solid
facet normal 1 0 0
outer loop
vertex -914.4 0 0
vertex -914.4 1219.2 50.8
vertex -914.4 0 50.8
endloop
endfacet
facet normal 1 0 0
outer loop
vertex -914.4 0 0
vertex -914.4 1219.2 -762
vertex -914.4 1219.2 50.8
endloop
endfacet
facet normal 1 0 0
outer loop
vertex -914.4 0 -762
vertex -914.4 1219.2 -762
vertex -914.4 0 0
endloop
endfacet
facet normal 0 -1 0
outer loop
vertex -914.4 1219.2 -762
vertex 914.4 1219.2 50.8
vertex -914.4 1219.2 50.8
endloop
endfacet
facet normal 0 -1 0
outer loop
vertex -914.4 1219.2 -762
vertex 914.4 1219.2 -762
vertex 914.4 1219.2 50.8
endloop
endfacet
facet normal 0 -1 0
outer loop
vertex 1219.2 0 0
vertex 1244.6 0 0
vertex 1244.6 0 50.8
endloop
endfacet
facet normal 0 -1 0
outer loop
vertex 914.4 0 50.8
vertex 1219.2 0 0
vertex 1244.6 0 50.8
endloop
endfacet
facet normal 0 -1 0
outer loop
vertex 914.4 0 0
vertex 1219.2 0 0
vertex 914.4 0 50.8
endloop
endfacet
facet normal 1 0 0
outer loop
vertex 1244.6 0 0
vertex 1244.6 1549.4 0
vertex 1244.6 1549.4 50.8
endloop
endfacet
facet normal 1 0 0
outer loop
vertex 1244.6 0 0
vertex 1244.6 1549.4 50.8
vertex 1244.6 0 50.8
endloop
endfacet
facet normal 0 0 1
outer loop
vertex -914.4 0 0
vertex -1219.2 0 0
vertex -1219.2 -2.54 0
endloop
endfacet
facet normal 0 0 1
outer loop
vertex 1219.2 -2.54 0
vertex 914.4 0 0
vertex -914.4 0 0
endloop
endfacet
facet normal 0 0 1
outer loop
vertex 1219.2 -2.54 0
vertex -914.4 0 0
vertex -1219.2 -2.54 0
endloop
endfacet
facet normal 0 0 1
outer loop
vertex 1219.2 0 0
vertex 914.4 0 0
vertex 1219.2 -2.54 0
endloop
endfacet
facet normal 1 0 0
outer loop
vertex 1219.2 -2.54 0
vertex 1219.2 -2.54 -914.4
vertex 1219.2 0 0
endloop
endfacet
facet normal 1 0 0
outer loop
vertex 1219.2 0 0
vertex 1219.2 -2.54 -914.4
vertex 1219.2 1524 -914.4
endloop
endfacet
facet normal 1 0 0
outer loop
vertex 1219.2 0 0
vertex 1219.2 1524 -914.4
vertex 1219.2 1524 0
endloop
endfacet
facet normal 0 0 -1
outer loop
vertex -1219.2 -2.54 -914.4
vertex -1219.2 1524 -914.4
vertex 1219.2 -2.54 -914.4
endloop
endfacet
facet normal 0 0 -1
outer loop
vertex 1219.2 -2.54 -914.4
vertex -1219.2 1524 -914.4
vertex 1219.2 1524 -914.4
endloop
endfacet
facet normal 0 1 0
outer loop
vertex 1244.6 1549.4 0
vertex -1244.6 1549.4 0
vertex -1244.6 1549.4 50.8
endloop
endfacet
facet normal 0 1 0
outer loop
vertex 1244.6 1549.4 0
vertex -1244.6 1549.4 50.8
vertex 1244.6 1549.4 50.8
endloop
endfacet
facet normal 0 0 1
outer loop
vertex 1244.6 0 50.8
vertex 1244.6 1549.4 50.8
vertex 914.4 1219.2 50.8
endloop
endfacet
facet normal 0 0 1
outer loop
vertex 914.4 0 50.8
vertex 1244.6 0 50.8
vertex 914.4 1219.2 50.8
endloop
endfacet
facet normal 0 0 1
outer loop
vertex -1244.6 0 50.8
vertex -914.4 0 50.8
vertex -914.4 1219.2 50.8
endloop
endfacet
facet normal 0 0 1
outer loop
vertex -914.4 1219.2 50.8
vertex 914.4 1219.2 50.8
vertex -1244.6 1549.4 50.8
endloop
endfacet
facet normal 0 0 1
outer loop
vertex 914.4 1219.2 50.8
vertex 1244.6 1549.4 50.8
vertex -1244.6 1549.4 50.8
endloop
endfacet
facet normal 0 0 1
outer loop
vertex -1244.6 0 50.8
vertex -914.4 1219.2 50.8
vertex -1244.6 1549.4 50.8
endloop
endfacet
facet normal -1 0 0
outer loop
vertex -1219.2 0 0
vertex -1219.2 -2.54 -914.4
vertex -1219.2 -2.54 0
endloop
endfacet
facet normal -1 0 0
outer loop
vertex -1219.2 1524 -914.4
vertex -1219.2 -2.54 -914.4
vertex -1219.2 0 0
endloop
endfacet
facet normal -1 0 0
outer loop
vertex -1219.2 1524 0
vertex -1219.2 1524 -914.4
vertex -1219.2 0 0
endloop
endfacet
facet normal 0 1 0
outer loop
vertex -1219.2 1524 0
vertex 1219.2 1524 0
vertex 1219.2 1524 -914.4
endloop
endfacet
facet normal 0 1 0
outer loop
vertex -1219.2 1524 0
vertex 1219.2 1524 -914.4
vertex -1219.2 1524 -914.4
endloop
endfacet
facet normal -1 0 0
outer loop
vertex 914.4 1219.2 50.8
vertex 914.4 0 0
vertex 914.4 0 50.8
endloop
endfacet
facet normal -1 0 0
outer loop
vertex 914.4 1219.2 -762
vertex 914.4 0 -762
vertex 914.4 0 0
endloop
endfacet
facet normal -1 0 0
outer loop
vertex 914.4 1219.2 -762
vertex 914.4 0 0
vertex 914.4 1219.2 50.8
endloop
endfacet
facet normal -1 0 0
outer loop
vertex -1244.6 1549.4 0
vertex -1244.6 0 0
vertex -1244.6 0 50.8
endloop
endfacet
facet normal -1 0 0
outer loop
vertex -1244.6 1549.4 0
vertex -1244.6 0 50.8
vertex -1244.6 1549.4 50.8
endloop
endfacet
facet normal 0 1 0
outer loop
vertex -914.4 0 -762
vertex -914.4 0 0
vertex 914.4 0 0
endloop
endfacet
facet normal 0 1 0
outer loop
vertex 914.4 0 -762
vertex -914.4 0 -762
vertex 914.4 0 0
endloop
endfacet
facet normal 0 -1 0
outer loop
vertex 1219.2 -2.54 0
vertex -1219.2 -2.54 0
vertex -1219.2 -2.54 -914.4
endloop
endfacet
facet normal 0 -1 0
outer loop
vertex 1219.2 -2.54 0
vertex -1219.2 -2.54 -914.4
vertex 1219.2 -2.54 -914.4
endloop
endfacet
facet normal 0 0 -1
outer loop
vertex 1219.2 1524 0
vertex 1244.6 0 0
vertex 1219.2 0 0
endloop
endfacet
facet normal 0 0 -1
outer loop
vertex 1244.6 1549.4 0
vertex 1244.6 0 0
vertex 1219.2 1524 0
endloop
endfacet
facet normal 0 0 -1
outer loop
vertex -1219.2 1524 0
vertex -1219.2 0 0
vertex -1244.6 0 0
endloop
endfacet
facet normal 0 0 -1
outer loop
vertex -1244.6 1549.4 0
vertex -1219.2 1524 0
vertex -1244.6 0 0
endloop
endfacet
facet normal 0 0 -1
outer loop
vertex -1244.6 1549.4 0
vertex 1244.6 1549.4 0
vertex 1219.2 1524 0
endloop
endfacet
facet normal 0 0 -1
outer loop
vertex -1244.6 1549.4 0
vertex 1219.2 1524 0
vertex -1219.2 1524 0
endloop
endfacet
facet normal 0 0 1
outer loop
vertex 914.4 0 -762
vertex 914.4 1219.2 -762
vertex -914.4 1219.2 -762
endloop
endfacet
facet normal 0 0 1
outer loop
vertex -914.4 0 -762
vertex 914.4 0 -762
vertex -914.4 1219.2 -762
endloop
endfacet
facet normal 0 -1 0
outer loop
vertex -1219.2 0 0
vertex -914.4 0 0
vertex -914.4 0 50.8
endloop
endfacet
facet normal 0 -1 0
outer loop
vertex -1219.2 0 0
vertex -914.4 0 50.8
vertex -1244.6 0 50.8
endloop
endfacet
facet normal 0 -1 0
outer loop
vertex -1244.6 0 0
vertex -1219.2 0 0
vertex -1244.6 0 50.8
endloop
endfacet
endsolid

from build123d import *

# Parameters (mm, degrees)
BOSS_EXTRUDE1_DEPTH = 762
SKETCH2_W           = 2438.4
SKETCH2_H           = 1524
BOSS_EXTRUDE2_DEPTH = 152.4
SKETCH3_W           = 2438.4
SKETCH3_H           = 914.4
BOSS_EXTRUDE3_DEPTH = 2.54
BOSS_EXTRUDE4_DEPTH = 50.8


with BuildPart() as part:
    # Sketch1 → Boss-Extrude1 (new body)
    with BuildSketch(Plane.XY):
        Polygon((-1219.2, 0), (-914.4, 0), (-914.4, 1219.2), (914.4, 1219.2), (914.4, 0), (1219.2, 0), (1219.2, 1524), (-1219.2, 1524), align=None)
    extrude(amount=-BOSS_EXTRUDE1_DEPTH)

    # Sketch2 → Boss-Extrude2 (add)
    with BuildSketch(Plane(origin=(0, 0, -762), x_dir=(-1, 0, 0), z_dir=(0, 0, -1))):
        with Locations((0, 762)):
            Rectangle(SKETCH2_W, SKETCH2_H)
    extrude(amount=BOSS_EXTRUDE2_DEPTH)

    # Sketch3 → Boss-Extrude3 (add)
    with BuildSketch(Plane.XZ):
        with Locations((0, -457.2)):
            Rectangle(SKETCH3_W, SKETCH3_H)
    extrude(amount=BOSS_EXTRUDE3_DEPTH)

    # Sketch4 → Boss-Extrude4 (add)
    with BuildSketch(Plane.XY):
        Polygon((-914.4, 0), (-1244.6, 0), (-1244.6, 1549.4), (1244.6, 1549.4), (1244.6, 0), (914.4, 0), (914.4, 1219.2), (-914.4, 1219.2), align=None)
    extrude(amount=BOSS_EXTRUDE4_DEPTH)


solid = part.part
